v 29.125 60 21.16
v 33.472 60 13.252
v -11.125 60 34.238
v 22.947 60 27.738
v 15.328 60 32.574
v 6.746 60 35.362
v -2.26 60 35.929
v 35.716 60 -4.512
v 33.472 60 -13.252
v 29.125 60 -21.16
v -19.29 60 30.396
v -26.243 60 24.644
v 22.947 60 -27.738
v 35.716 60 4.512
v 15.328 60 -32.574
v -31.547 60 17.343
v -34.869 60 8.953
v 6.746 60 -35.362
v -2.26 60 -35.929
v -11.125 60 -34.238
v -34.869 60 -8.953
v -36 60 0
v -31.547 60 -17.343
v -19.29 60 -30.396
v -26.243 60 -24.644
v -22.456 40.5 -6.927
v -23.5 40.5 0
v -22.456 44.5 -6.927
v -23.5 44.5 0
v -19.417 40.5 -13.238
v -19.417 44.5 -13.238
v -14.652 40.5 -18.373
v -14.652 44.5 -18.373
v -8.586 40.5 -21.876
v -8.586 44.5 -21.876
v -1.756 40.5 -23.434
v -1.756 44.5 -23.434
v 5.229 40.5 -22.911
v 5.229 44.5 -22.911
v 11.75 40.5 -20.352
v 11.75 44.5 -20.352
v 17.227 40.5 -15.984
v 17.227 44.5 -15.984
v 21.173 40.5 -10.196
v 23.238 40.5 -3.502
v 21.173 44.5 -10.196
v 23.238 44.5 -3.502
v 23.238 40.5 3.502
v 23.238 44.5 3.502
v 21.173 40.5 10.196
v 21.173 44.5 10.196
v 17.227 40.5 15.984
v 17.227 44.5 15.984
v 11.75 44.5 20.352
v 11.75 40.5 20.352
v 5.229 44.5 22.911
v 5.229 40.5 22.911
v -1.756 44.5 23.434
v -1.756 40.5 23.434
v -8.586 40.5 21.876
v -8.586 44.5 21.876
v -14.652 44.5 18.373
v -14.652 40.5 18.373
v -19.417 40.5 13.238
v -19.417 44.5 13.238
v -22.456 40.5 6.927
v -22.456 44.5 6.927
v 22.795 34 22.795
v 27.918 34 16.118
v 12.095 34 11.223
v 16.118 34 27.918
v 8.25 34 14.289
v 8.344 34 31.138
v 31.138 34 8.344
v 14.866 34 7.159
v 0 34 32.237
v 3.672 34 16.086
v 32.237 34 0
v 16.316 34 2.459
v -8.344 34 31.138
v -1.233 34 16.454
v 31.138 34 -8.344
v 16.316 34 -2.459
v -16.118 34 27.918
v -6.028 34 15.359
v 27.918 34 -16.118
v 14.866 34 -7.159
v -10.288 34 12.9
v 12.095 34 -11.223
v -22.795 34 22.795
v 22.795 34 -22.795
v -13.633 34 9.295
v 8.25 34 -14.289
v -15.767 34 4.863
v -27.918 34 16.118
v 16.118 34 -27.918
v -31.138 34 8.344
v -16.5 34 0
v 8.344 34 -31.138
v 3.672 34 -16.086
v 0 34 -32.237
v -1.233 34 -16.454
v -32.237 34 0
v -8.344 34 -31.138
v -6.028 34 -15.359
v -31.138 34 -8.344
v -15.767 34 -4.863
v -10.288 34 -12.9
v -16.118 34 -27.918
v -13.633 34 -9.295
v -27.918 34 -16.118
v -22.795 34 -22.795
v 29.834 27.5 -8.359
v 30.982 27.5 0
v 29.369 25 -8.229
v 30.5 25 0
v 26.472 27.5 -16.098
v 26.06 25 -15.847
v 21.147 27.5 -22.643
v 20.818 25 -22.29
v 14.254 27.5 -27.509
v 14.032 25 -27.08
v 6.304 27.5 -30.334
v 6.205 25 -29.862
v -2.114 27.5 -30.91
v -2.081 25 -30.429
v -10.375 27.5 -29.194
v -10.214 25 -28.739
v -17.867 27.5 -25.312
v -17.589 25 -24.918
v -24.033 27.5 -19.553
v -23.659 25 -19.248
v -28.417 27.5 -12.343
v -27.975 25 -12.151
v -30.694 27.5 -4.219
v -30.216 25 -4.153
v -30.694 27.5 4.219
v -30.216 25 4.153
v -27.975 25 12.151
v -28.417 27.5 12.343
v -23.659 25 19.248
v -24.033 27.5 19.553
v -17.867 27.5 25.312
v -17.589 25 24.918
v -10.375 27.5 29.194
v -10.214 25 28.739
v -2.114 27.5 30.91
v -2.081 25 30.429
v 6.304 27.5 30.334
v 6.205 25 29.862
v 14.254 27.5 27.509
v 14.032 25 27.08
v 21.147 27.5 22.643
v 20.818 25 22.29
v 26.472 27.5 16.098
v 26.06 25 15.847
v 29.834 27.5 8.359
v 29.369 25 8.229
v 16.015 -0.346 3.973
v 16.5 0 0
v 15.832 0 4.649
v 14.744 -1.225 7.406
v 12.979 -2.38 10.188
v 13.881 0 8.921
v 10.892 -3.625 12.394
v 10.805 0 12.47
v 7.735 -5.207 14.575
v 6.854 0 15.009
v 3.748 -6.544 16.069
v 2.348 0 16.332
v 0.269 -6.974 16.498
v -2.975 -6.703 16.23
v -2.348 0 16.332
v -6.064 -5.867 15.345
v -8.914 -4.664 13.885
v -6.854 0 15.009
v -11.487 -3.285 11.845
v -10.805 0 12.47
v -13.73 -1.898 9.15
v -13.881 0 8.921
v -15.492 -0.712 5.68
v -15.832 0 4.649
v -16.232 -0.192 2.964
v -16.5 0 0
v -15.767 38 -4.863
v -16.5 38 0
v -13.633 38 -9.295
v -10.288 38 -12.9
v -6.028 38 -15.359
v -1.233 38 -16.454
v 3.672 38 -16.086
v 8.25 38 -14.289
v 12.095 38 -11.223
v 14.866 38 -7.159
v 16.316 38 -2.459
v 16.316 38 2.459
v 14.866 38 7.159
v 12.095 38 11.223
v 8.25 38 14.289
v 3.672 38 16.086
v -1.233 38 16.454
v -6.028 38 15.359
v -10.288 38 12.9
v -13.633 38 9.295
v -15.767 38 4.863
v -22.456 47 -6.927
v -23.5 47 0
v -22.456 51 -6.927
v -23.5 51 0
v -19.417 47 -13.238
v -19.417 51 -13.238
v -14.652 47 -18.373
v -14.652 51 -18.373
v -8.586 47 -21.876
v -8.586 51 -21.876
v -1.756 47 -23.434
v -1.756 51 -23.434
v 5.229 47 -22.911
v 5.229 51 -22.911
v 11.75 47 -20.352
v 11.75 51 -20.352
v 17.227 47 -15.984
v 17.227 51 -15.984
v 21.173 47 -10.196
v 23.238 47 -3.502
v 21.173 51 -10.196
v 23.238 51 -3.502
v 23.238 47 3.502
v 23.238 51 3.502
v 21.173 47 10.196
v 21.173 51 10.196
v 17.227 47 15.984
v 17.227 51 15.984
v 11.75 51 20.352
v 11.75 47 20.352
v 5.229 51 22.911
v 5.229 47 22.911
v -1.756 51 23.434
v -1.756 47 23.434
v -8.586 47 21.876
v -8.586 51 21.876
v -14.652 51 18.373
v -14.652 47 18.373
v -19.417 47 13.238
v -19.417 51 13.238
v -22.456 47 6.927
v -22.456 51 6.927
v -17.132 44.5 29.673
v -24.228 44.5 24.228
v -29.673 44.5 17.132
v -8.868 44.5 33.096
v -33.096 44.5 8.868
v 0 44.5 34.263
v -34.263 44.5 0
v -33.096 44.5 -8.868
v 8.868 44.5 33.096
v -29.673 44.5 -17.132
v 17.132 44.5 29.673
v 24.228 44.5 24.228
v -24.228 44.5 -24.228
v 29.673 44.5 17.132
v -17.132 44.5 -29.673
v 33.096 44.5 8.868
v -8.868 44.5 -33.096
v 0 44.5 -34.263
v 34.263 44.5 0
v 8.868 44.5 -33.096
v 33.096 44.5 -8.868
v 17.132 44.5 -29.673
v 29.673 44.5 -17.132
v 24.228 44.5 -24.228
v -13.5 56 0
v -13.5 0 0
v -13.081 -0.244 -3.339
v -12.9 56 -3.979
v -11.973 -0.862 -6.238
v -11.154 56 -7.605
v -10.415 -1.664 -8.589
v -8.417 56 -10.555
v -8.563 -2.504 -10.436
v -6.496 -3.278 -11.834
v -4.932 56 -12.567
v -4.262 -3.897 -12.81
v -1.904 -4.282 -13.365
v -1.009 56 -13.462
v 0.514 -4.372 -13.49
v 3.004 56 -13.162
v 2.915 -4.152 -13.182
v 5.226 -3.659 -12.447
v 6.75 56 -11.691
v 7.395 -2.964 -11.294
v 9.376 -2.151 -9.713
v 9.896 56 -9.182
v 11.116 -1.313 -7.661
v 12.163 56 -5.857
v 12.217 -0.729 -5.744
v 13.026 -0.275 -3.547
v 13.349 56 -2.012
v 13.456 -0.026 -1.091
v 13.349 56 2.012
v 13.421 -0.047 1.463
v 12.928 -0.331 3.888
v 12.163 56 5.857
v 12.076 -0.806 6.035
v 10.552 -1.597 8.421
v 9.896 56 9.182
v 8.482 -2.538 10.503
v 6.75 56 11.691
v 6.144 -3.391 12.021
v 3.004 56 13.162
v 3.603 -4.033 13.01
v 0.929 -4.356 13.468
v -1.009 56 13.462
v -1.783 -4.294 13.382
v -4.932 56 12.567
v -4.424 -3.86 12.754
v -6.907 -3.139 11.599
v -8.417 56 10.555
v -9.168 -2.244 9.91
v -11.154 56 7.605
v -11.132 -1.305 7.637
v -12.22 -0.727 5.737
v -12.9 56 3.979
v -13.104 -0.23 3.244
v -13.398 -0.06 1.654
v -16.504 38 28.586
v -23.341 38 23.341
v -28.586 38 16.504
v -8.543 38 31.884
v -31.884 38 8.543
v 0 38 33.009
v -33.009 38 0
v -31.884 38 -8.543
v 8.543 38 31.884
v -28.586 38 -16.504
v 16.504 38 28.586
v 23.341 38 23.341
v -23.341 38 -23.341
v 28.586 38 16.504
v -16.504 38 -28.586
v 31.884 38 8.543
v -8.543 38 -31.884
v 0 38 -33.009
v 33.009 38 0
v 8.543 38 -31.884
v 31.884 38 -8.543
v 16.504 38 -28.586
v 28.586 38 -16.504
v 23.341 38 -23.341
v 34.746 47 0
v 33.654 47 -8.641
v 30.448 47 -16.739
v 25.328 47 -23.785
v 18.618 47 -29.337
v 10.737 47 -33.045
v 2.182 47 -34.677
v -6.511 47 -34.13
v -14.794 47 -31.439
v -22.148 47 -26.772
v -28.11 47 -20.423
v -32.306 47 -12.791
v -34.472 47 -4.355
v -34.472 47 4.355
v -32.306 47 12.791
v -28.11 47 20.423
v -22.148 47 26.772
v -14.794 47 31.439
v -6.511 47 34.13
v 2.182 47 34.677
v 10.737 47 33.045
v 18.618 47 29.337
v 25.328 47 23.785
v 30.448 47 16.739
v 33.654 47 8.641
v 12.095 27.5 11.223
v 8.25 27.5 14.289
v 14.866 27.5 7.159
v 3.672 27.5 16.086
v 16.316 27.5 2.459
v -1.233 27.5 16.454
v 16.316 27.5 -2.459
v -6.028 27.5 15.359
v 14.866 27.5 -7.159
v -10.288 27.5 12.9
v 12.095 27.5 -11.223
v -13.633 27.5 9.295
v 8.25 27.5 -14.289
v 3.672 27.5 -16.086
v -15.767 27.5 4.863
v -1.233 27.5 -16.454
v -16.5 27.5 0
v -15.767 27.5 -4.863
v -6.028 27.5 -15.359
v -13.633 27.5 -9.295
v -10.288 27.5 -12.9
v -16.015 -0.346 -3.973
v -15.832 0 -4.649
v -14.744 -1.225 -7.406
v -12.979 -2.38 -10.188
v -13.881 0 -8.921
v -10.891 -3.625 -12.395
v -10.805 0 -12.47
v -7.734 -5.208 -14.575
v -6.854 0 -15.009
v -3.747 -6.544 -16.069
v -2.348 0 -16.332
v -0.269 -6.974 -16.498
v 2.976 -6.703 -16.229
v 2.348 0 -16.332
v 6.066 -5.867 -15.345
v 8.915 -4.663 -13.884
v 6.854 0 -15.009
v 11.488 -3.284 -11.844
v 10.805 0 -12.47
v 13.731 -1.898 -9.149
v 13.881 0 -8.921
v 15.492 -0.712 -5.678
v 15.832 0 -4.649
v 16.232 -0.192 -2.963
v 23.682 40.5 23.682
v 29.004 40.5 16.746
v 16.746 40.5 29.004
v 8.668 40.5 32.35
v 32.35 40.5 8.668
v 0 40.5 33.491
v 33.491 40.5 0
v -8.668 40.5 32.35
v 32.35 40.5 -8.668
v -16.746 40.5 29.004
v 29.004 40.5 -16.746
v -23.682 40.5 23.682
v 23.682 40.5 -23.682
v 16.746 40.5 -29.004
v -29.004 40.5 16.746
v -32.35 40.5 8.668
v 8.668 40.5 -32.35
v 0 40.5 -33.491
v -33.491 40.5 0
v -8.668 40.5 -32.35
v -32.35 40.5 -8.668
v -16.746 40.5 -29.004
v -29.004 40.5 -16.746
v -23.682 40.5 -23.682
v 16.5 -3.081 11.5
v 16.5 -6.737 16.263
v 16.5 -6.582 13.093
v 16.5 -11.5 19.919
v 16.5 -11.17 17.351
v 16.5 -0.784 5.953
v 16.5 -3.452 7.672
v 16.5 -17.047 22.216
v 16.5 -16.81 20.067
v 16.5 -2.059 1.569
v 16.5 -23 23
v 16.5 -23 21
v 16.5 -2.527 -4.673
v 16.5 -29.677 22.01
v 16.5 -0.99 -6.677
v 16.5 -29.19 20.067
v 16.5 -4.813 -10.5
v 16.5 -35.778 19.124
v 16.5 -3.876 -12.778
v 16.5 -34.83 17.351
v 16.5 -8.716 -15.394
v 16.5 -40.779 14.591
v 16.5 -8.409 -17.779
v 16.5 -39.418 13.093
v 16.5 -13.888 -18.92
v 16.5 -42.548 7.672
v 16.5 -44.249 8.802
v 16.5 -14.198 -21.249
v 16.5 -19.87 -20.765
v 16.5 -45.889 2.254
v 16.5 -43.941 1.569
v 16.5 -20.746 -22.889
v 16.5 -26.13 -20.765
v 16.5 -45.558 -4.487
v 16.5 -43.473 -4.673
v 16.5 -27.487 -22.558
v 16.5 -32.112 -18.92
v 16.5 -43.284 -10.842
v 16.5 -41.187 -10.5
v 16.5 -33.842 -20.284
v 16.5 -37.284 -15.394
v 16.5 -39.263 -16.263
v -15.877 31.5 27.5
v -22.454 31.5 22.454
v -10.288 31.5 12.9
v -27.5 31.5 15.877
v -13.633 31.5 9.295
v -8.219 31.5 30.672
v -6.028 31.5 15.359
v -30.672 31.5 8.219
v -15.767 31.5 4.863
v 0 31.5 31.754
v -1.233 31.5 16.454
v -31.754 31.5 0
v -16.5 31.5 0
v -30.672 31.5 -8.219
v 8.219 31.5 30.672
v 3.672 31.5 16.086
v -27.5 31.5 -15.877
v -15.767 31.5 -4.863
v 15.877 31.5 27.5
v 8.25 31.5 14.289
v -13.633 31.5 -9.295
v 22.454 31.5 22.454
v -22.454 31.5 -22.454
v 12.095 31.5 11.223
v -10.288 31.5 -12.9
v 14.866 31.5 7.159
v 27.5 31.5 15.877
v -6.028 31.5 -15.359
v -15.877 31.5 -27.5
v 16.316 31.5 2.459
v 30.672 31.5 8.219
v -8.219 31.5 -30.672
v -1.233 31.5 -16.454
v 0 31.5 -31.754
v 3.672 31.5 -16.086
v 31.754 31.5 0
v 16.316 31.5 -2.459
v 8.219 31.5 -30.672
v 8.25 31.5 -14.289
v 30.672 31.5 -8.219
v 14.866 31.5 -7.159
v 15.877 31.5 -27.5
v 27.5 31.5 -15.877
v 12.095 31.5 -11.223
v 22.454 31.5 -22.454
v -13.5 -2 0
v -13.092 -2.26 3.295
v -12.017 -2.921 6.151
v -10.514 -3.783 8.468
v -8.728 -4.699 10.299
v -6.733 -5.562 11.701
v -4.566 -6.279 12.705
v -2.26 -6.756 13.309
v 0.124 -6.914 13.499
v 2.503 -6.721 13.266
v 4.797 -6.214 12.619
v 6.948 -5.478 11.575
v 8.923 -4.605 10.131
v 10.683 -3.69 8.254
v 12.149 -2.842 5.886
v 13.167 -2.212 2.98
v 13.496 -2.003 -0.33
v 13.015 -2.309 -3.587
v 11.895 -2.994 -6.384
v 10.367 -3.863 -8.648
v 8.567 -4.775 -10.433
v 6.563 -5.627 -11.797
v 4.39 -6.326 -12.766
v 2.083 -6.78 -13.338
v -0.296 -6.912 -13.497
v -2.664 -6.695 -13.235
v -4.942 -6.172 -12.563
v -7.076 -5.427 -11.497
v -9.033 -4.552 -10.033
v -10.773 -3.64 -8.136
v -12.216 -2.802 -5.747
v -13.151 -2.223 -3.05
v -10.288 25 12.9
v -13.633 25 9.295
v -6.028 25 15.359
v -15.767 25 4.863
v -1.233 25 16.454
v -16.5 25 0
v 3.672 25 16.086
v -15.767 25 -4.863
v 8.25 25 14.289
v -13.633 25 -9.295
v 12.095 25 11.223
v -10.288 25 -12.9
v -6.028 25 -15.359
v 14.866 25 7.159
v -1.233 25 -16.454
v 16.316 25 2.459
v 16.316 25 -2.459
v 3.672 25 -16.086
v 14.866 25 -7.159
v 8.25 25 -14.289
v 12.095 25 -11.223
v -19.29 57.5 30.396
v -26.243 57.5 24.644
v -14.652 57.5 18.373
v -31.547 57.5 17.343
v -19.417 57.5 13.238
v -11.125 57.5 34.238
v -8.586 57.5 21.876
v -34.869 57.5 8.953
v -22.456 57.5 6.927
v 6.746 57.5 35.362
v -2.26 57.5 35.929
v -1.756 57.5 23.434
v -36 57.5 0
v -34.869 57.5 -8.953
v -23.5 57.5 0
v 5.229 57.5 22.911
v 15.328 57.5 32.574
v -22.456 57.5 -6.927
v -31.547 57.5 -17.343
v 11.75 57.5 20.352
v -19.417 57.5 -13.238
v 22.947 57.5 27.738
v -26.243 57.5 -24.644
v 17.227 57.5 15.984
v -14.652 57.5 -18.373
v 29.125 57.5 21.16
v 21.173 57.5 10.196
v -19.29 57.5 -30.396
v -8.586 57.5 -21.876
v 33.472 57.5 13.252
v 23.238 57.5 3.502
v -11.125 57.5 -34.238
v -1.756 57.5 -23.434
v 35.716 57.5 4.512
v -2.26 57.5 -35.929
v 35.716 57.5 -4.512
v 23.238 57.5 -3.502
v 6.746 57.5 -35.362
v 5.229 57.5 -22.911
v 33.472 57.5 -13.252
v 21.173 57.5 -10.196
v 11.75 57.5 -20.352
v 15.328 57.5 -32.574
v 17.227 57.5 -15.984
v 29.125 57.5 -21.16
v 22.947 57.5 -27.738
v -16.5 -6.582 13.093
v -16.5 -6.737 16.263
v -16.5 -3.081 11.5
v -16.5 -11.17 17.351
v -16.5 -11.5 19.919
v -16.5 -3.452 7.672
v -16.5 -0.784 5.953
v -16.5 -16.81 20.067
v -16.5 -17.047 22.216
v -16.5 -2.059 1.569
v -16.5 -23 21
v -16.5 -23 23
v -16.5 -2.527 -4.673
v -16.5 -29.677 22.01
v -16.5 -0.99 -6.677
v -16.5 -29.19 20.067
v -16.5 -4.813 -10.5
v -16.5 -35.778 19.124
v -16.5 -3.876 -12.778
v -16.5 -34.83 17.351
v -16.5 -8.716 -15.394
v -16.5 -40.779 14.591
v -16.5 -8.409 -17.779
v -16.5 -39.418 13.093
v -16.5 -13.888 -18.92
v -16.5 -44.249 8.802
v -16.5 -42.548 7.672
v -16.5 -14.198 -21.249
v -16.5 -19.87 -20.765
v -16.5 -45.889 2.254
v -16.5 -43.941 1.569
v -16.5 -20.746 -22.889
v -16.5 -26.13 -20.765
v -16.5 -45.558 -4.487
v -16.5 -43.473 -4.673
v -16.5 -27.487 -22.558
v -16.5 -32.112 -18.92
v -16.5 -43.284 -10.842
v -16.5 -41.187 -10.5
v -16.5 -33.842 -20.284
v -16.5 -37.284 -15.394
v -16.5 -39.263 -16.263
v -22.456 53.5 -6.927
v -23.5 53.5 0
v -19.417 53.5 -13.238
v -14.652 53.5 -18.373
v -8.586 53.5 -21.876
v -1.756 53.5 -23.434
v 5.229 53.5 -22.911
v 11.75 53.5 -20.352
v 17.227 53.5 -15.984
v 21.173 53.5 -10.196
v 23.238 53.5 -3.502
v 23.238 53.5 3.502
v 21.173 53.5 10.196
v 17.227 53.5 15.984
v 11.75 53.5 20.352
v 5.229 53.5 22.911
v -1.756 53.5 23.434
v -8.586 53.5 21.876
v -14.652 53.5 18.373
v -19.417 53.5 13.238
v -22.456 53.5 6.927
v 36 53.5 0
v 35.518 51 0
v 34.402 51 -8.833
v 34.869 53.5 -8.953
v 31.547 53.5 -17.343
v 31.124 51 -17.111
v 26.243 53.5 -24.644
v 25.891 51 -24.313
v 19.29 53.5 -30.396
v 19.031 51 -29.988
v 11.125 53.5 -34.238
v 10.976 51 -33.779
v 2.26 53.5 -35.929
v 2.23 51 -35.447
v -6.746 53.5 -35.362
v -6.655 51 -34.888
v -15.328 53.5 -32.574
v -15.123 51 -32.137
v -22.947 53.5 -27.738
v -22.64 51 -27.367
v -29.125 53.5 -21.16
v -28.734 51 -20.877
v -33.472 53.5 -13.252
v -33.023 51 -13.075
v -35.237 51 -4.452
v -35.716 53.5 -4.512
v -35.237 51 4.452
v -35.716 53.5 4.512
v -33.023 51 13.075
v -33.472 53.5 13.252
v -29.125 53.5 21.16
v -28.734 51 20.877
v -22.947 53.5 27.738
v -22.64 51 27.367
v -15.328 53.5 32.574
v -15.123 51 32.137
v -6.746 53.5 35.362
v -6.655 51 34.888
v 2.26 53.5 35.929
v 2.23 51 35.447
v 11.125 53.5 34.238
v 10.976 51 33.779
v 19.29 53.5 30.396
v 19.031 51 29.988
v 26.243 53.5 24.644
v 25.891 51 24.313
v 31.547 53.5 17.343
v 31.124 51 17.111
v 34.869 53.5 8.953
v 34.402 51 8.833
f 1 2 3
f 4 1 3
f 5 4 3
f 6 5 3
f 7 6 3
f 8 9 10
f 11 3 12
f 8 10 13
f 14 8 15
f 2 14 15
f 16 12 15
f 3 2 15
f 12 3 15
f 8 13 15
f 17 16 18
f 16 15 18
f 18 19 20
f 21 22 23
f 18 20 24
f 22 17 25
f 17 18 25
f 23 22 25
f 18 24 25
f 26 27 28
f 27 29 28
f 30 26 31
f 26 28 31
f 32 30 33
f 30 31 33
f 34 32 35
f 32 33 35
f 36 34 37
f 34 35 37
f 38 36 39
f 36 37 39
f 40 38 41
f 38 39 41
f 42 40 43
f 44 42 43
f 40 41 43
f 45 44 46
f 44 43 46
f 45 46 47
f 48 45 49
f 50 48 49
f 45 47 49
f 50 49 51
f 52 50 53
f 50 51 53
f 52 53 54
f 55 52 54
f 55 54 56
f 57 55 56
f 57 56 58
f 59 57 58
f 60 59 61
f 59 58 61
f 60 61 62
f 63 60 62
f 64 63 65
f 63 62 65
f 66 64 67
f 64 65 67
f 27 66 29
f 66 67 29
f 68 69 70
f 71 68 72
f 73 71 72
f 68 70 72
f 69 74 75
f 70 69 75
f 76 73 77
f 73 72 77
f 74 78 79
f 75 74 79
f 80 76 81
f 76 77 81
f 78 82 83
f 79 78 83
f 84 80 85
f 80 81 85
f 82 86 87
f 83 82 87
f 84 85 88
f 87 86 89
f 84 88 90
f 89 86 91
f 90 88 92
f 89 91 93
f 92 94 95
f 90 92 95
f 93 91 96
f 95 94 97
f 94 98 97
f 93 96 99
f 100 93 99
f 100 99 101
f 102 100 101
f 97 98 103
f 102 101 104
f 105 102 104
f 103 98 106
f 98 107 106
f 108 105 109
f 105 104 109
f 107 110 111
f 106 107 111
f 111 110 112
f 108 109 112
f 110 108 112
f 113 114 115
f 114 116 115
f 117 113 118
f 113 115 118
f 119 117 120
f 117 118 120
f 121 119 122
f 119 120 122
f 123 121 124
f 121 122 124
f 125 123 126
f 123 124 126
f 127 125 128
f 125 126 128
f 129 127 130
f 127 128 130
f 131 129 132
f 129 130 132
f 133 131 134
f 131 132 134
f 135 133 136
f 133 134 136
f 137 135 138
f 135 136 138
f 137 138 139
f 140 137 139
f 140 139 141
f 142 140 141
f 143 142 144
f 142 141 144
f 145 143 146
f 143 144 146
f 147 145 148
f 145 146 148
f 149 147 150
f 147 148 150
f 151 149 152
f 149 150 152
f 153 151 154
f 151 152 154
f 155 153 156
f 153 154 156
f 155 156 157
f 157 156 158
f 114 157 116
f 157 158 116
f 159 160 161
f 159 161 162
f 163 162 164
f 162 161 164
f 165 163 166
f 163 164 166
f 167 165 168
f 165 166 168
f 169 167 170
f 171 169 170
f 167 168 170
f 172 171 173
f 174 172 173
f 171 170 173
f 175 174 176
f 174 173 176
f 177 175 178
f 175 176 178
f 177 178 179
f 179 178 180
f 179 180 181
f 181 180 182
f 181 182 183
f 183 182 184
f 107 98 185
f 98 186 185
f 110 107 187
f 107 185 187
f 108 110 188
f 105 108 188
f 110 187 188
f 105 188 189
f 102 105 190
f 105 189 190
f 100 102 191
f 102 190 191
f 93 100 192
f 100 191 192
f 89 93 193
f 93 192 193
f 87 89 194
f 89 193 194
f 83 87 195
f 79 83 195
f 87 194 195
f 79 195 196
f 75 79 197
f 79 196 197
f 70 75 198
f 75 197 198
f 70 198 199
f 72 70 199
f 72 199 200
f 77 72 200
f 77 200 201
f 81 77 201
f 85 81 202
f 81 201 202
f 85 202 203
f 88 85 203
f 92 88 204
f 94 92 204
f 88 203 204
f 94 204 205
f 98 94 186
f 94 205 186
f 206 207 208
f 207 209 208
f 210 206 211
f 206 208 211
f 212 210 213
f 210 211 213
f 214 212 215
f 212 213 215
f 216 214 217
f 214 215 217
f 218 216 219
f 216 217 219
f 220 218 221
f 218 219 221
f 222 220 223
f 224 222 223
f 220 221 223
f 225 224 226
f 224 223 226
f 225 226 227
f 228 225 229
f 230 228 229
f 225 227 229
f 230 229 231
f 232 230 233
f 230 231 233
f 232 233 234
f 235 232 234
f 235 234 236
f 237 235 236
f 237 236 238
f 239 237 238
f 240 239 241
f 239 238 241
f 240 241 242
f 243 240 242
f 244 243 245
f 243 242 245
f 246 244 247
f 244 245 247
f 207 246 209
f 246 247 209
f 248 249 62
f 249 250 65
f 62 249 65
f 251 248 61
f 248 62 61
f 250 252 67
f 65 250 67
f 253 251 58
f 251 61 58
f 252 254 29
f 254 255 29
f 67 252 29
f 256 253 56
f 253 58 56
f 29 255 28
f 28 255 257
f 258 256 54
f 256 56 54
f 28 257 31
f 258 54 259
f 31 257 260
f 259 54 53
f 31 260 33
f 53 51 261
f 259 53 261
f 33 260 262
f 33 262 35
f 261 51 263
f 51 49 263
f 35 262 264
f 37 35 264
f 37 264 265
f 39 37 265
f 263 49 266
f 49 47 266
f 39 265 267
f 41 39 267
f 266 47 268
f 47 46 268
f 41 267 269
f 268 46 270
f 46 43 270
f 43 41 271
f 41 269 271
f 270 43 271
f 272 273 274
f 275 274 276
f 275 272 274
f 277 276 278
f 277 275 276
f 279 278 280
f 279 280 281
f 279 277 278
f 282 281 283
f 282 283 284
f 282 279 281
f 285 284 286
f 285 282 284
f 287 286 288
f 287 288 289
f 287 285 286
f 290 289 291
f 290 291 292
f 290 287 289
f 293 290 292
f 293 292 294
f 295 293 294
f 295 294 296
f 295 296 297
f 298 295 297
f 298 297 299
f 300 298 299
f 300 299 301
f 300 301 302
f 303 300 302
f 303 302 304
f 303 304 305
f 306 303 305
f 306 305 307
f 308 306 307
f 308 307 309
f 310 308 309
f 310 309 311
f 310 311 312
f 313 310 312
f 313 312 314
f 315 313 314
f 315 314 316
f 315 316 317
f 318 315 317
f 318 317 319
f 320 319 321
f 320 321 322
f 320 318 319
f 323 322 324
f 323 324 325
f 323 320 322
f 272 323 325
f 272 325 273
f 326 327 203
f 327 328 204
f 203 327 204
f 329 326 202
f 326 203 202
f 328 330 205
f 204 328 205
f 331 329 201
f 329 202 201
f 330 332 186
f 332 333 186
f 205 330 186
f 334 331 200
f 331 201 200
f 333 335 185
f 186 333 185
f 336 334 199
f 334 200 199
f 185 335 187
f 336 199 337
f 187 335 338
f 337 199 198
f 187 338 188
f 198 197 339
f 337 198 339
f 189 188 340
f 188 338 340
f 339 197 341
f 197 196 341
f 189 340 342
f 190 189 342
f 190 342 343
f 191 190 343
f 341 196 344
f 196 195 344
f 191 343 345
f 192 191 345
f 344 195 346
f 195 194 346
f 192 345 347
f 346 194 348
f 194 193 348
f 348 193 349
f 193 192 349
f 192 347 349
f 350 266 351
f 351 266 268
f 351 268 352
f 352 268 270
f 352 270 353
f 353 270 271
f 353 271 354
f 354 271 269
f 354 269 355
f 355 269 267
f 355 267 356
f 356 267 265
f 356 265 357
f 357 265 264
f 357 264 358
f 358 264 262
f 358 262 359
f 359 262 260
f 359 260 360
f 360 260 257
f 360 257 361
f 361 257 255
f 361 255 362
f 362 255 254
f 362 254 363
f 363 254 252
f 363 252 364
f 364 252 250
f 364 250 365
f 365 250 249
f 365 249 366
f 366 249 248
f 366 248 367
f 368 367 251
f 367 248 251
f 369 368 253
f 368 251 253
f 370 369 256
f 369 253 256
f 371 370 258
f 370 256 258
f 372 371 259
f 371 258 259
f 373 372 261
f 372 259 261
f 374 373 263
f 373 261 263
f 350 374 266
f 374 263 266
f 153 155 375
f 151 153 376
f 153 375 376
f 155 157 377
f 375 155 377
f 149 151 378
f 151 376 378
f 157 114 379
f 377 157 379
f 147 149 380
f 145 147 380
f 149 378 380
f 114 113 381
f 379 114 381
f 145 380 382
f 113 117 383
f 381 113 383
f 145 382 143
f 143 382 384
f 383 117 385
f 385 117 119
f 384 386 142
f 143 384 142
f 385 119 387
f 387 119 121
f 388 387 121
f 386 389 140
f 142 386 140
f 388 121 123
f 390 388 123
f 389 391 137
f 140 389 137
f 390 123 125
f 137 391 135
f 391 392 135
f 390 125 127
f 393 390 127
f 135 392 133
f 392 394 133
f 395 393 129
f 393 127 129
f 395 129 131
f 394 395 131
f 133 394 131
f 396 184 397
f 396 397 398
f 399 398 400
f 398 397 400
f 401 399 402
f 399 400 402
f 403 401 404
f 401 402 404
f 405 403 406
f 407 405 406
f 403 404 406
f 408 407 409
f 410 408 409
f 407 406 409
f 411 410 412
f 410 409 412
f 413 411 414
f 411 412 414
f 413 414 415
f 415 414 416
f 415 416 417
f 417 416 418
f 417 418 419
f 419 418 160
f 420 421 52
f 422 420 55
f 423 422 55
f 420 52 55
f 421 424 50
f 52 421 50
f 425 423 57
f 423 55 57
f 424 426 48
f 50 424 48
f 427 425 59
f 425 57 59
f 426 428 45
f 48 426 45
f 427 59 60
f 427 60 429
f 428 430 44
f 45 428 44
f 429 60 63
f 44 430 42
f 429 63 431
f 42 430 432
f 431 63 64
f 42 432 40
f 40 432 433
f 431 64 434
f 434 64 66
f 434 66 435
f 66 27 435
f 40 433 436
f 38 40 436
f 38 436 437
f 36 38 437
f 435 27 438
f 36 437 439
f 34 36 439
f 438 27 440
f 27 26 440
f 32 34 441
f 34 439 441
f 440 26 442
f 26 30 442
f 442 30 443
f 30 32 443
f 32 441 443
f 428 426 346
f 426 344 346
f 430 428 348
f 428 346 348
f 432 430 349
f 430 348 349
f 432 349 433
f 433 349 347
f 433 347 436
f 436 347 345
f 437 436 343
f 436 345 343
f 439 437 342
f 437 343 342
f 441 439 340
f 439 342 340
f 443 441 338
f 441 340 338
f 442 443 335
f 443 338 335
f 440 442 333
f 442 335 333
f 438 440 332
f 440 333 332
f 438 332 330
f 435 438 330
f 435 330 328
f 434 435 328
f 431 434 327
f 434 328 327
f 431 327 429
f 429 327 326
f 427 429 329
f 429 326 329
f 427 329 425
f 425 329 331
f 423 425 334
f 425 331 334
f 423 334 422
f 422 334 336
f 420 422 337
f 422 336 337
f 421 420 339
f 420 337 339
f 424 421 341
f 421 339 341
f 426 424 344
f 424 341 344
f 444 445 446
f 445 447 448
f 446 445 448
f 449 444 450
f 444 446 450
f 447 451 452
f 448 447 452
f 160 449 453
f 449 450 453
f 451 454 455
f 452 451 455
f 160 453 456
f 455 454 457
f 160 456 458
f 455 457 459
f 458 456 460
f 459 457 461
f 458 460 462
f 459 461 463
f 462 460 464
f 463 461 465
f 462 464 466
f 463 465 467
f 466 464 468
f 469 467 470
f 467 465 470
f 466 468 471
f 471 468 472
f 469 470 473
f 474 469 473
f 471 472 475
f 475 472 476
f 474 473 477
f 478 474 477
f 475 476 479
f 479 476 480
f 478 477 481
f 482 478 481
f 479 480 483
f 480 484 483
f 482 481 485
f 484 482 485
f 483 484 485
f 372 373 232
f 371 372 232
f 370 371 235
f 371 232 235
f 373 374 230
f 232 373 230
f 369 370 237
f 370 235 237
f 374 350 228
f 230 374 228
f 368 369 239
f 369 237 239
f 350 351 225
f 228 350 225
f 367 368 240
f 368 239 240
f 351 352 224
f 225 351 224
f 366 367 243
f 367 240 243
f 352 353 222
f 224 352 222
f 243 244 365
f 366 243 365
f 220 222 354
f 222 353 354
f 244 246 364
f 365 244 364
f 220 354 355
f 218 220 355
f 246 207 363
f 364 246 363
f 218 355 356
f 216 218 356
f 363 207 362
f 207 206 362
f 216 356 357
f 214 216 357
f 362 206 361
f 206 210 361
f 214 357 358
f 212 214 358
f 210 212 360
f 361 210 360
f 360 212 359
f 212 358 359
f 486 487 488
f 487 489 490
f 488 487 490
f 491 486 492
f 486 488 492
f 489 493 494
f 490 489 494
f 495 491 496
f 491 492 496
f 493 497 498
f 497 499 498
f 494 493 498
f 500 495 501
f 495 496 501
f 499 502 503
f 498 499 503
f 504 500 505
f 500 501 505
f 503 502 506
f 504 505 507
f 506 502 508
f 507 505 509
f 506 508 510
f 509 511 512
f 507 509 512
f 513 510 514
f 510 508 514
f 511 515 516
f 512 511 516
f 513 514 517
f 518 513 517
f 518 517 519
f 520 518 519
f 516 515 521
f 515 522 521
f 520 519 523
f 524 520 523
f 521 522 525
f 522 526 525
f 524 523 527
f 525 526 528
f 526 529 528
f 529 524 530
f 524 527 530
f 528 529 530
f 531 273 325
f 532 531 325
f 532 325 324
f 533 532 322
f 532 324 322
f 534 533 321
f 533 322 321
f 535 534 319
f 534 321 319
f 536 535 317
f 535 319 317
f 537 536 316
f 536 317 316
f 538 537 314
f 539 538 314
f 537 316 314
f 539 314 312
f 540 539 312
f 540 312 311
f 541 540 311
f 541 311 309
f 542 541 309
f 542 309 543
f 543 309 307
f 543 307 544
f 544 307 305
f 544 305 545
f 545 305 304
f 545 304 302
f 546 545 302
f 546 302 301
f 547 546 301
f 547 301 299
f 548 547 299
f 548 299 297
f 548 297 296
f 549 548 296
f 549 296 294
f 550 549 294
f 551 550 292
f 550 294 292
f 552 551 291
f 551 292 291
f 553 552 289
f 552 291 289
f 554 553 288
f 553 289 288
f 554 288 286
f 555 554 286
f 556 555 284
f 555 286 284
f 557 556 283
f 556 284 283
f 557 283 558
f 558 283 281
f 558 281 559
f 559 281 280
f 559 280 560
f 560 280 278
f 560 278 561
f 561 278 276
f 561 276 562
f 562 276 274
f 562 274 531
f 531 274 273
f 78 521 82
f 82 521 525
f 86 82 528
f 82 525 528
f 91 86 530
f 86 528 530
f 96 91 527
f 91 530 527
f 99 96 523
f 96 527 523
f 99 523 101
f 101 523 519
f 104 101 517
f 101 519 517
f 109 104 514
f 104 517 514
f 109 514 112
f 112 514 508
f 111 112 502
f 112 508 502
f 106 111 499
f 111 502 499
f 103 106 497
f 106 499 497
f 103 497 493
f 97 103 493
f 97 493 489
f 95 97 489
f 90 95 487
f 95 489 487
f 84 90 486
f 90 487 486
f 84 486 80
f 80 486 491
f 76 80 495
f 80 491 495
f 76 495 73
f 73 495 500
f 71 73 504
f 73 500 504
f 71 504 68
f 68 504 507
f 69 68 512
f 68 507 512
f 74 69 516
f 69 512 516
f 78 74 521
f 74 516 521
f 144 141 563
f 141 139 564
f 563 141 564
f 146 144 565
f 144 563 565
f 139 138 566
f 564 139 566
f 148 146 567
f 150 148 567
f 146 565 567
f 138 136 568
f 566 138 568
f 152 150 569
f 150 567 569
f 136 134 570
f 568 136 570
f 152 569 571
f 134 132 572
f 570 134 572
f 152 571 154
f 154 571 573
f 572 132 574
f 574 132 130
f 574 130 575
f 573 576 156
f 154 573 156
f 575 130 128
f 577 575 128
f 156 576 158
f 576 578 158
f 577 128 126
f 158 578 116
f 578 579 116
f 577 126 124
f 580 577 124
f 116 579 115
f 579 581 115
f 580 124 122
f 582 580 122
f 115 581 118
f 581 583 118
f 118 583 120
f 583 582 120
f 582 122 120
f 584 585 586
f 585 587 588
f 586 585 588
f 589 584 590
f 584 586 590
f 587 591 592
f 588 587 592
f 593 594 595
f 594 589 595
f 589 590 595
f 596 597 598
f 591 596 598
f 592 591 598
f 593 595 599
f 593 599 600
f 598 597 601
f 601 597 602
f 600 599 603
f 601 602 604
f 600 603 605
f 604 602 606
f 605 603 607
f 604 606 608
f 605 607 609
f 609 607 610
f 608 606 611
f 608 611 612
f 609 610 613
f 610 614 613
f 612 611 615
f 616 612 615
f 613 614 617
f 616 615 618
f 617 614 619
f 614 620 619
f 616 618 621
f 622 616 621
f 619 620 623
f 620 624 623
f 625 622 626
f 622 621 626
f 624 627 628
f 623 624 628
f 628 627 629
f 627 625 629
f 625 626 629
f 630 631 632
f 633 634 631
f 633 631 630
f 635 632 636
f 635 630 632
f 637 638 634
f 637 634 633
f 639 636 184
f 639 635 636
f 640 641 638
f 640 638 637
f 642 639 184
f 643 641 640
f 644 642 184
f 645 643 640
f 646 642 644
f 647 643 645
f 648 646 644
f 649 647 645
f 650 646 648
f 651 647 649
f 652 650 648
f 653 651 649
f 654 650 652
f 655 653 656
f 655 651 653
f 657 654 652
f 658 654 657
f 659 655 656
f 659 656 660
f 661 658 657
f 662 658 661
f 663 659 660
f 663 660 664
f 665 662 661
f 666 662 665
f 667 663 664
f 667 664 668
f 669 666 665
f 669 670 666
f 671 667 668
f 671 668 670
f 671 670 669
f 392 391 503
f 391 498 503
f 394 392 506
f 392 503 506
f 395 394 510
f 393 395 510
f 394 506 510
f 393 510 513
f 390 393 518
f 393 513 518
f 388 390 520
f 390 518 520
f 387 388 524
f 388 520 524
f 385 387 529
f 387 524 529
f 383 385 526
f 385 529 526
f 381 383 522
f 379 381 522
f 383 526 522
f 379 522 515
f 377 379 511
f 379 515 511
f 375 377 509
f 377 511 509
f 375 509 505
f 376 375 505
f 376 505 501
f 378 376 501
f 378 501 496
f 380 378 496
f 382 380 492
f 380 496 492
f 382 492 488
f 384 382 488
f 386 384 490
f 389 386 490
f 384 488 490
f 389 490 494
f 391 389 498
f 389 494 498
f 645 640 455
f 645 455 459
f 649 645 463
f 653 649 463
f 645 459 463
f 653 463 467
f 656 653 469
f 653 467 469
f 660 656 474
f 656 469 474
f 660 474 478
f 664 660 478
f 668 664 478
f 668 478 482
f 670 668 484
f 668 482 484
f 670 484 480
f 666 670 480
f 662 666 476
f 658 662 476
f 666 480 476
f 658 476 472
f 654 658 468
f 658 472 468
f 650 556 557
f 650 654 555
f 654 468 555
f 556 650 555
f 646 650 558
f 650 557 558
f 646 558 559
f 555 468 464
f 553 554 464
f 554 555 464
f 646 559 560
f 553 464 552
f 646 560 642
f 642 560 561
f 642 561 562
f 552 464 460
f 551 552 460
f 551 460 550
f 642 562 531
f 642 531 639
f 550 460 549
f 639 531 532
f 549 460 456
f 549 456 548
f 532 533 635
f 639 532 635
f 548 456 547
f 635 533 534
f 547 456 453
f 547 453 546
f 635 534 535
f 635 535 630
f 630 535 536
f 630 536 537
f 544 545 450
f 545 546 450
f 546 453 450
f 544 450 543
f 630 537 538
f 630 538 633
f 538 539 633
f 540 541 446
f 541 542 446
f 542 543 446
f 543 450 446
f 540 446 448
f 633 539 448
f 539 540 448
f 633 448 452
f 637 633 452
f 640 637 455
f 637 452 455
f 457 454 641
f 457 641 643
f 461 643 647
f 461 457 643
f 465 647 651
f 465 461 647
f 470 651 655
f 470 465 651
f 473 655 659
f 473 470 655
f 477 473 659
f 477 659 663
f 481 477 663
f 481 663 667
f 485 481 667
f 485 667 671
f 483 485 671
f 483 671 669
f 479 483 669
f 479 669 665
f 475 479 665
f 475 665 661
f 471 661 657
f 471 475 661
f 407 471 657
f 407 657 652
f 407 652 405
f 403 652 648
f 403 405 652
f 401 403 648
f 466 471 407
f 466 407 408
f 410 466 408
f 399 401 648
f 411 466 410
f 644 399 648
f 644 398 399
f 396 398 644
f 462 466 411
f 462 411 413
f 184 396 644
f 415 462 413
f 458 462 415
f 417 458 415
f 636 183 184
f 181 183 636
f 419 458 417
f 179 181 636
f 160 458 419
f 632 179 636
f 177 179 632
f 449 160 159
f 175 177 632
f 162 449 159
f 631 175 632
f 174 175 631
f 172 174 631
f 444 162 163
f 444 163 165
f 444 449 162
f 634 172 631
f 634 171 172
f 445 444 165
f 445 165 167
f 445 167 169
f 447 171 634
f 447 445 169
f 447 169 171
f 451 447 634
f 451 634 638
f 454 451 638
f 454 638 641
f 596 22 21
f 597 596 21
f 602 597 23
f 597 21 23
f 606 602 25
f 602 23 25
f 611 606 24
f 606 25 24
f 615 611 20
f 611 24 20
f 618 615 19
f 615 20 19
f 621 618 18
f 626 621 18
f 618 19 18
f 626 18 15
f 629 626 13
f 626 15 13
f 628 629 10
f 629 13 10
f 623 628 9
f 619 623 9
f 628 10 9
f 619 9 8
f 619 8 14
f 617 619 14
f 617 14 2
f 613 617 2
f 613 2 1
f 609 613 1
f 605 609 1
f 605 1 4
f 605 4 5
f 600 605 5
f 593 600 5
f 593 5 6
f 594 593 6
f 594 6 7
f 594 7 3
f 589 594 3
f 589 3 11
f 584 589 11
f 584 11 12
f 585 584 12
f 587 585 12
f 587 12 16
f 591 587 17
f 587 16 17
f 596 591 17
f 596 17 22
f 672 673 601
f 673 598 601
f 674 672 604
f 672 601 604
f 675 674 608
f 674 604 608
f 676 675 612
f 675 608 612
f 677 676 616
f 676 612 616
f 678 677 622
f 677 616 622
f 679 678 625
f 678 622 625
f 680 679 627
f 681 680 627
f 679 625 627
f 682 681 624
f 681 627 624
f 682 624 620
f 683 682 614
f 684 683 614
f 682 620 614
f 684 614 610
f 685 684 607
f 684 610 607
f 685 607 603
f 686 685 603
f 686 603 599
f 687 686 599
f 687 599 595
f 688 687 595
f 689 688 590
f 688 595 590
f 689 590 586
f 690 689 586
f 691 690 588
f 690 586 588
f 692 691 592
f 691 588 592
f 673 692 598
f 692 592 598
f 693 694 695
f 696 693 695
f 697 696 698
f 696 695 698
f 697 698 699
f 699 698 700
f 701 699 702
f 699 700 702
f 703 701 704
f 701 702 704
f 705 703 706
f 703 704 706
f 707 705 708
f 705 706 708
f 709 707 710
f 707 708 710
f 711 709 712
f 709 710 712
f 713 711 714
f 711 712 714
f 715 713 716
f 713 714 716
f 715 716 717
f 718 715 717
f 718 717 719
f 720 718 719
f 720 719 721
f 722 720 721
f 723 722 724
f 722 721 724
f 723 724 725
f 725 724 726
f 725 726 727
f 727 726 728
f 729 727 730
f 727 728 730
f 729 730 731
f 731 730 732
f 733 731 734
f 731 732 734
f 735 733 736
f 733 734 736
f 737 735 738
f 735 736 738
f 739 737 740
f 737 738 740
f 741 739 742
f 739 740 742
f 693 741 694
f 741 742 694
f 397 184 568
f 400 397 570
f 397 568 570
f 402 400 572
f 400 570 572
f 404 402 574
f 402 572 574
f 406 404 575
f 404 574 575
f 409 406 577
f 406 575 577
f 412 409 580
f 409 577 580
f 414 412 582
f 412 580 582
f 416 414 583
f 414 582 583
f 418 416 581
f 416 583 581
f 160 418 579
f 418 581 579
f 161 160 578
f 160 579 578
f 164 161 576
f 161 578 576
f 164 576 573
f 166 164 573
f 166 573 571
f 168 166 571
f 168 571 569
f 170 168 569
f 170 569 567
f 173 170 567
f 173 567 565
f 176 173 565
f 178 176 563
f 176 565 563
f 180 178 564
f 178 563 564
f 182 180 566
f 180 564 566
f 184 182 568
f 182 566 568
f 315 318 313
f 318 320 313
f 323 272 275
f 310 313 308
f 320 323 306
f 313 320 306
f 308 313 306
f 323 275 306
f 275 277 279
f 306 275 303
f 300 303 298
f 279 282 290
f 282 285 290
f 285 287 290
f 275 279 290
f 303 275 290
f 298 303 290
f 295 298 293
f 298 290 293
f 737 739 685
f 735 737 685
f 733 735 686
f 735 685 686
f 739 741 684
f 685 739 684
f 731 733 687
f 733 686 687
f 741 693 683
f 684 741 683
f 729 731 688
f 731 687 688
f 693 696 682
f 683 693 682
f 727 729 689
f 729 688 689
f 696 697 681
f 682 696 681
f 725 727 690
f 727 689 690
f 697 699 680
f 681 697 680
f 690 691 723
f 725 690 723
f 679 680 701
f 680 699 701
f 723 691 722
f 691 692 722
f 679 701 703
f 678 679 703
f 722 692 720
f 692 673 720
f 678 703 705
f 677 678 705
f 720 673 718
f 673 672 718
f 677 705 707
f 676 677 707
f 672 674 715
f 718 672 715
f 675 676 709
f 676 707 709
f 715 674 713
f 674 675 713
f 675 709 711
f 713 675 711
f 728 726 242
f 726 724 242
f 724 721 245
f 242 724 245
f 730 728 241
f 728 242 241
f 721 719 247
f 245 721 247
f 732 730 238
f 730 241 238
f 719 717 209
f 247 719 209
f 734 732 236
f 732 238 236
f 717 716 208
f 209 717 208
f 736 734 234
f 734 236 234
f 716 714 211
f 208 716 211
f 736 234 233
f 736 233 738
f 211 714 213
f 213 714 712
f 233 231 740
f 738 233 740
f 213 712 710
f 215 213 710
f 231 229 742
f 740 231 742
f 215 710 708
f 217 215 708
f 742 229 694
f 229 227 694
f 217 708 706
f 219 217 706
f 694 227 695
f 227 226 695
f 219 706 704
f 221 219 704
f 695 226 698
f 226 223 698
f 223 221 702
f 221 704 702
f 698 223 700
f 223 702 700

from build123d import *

# Parameters (mm, degrees)
ESQUISSE1_W             = 33
ESQUISSE1_H             = 2
BOSS_EXTRU_1_REACH      = 80.689
ESQUISSE5_R             = 16.5
ESQUISSE5_R_2           = 13.5
ENL_V_MAT_EXTRU_1_REACH = 80.689
ESQUISSE6_R             = 13.5


with BuildPart() as part:
    # Esquisse1 → Révolution1 (revolve)
    with BuildSketch(Plane.XY, mode=Mode.PRIVATE) as r_volution1_sk:
        with Locations((0, -1)):
            Rectangle(ESQUISSE1_W, ESQUISSE1_H)
    revolve(r_volution1_sk.sketch.rotate(Axis((0, -23, 0), (1, 0, 0)), 90), axis=Axis((0, -23, 0), (1, 0, 0)))

    # Esquisse5 → Boss.-Extru.1 (add, up to next)
    with BuildSketch(Plane.XZ, mode=Mode.PRIVATE) as boss_extru_1_sk1:
        with Locations(Location((0, 0, 0), (0, 0, 180))):
            Circle(ESQUISSE5_R)
        with Locations(Location((0, 0, 0), (0, 0, 180))):
            Circle(ESQUISSE5_R_2, mode=Mode.SUBTRACT)
    boss_extru_1_tool1 = extrude(boss_extru_1_sk1.sketch, amount=BOSS_EXTRU_1_REACH, mode=Mode.PRIVATE) - part.part


with BuildPart() as body_2:
    # Esquisse2 → Révolution2 (revolve)
    with BuildSketch(Plane.XY):
        Polygon((-16.5, 0), (-16.5, 25), (-36, 25), (-36, 27.5), (-16.5, 27.5), (-16.5, 31.5), (-36, 31.5), (-36, 34), (-16.5, 34), (-16.5, 38), (-36, 38), (-36, 40.5), (-23.5, 40.5), (-23.5, 44.5), (-36, 44.5), (-36, 47), (-23.5, 47), (-23.5, 51), (-36, 51), (-36, 53.5), (-23.5, 53.5), (-23.5, 57.5), (-36, 57.5), (-36, 60), (0, 60), (0, 56), (-13.5, 56), (-13.5, 0), align=None)
    revolve(axis=Axis((0, 56, 0), (0, -1, 0)))

    # Esquisse4 → Enlèvement de matière-Révolution1 (revolve, cut)
    with BuildSketch(Plane.XY, mode=Mode.PRIVATE) as enl_vement_de_mati_re_r_volution1_sk:
        Polygon((-36, 60), (-36, 53.5), (-30.5, 25), (-37, 25), (-37, 60), align=None)
    revolve(enl_vement_de_mati_re_r_volution1_sk.sketch.rotate(Axis((0, 0, 0), (0, 1, 0)), 180), axis=Axis((0, 0, 0), (0, 1, 0)), mode=Mode.SUBTRACT)


with BuildPart() as part_1:
    add(part.part)

    add(body_2.part)  # Boss.-Extru.1 merges body 2
    add(boss_extru_1_tool1.solids().sort_by_distance((16.03331, 0, 0))[0])
    add(boss_extru_1_tool1.solids().sort_by_distance((16.03331, 0, 0))[1])

    # Esquisse6 → Enlèv. mat.-Extru.1 (cut, up to next)
    with BuildSketch(Plane(origin=(0, 0, 0), x_dir=(1, 0, 0), z_dir=(0, 1, 0)), mode=Mode.PRIVATE) as enl_v_mat_extru_1_sk1:
        with Locations(Location((0, 0, 0), (0, 0, 180))):
            Circle(ESQUISSE6_R)
    enl_v_mat_extru_1_tool1 = extrude(enl_v_mat_extru_1_sk1.sketch, amount=-ENL_V_MAT_EXTRU_1_REACH, mode=Mode.PRIVATE) & part_1.part
    add(enl_v_mat_extru_1_tool1.solids().sort_by_distance((0, 0, 0))[0], mode=Mode.SUBTRACT)


solid = part_1.part
